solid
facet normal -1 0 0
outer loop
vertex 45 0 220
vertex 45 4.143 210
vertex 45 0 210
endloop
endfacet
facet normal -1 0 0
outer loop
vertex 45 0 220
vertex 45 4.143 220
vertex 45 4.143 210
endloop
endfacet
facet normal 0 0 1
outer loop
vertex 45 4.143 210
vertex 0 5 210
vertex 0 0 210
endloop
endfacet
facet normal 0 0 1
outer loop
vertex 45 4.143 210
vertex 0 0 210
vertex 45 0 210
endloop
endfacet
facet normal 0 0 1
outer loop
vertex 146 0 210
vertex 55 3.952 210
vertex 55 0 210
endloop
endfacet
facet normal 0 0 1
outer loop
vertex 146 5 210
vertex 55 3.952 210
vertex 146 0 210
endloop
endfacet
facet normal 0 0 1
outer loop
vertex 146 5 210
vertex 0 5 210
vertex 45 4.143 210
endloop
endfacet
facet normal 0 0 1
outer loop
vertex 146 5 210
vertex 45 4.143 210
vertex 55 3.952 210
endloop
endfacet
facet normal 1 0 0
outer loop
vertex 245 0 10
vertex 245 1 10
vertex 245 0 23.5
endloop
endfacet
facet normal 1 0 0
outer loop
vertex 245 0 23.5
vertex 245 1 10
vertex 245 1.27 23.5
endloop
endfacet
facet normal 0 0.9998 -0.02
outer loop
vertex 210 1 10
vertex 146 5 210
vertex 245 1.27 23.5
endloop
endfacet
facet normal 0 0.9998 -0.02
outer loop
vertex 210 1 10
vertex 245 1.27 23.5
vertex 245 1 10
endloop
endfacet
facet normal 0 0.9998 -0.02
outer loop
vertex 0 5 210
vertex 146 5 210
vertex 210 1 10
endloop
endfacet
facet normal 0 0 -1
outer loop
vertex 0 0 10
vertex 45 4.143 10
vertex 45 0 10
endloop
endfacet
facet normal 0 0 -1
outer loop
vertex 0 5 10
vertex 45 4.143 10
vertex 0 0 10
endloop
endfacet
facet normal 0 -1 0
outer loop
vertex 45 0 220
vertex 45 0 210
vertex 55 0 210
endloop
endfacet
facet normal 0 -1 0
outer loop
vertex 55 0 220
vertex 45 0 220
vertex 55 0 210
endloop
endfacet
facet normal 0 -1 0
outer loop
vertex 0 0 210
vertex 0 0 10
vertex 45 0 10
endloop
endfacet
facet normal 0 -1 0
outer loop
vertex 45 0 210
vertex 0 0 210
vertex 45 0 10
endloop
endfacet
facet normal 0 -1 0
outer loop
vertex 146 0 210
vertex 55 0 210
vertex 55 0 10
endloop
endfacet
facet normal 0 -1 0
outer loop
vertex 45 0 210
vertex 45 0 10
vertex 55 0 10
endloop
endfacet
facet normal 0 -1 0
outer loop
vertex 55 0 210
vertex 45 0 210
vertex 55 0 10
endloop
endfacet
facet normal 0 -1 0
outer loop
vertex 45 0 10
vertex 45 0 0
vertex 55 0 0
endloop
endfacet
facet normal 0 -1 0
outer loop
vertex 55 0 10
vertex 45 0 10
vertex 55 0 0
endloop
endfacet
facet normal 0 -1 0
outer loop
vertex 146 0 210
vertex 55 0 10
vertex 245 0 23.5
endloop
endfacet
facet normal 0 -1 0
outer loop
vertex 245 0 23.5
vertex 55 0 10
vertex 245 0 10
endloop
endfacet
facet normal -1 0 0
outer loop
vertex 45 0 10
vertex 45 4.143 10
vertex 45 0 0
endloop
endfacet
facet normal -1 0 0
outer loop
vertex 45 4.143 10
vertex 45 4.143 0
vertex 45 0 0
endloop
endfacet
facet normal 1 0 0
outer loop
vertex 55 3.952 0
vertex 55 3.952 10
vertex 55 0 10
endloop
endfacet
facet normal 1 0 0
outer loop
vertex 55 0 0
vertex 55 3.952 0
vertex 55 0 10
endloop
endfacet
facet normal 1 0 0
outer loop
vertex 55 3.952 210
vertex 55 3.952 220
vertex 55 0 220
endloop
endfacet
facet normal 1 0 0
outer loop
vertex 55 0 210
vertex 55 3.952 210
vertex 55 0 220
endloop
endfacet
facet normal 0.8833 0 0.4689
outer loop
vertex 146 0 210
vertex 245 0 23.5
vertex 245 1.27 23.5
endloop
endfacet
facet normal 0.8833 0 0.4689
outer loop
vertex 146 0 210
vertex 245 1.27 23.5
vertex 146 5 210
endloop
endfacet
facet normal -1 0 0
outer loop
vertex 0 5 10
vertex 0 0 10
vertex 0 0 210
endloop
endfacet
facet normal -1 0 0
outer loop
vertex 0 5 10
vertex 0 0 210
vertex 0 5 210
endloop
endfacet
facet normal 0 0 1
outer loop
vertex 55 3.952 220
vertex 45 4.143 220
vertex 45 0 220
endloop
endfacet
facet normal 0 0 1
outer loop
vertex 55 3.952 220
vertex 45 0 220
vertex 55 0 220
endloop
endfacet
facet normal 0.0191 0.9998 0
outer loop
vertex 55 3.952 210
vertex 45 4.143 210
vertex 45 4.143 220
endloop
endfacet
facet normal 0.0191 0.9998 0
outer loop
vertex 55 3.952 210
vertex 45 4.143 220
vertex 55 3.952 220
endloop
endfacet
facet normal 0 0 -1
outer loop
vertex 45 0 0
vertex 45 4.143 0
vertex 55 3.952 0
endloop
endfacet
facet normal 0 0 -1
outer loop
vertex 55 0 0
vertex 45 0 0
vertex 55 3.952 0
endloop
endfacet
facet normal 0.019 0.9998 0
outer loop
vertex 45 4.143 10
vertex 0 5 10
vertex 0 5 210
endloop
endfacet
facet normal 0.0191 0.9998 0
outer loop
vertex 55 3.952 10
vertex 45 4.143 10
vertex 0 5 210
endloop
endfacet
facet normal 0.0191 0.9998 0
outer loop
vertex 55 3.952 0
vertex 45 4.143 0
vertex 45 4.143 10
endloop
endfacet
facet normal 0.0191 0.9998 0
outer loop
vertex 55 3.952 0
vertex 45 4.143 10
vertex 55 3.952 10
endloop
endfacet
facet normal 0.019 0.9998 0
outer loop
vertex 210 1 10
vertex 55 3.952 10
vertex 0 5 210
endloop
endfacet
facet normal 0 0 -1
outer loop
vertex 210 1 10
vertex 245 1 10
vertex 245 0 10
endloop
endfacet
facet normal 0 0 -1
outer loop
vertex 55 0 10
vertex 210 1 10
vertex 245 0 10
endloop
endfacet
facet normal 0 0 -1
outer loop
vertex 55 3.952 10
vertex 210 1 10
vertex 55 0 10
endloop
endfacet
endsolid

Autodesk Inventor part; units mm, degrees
ref_plane "YZ Plane" through (0, 0, 0) normal (1, 0, 0) x (0, 1, 0)
ref_plane "XZ Plane" through (0, 0, 0) normal (0, 1, 0) x (-1, 0, 0)
ref_plane "XY Plane" through (0, 0, 0) normal (0, 0, 1) x (1, 0, 0)
sketch "スケッチ1" plane through (0, 0, 0) normal (0, 1, 0) x (-1, 0, 0)
  point P0 (0, 0)
sketch "スケッチ2" plane through (0, 0, 0) normal (0, 0, 1) x (1, 0, 0)
  line L0 (0, 0) -> (0, 5)
  line L1 (0, 5) -> (210, 1)
  line L2 (0, 0) -> (210, 0)
  line L3 (210, 1) -> (210, 0)
  dimension "d0" = 5
  dimension "d1" = 210
  dimension "d28" = 1
extrude "押し出し1" add sketch "スケッチ2" along normal blind 220
sketch "スケッチ4" plane through (0, 0, 220) normal (0, 0, 1) x (1, 0, 0)
  line L0 (0, 5) -> (0, 0) projected
  line L1 (55, 0) -> (245, 0)
  line L2 (245, 0) -> (245, 5)
  line L3 (245, 5) -> (55, 5)
  line L4 (55, 5) -> (55, 0)
  line L5 (0, 5) -> (45, 5)
  line L6 (45, 5) -> (45, 0)
  line L7 (45, 0) -> (0, 0)
  line L8 (0, 0) -> (0, 5)
  point P0 (0, 0)
  dimension "d8" = 5
  dimension "d9" = 190
  dimension "d10" = 55
  dimension "d23" = 45
  dimension "d30" = 5
extrude "押し出し2" cut sketch "スケッチ4" against normal blind 10
sketch "スケッチ5" plane through (0, 0, 0) normal (0, 0, -1) x (-1, 0, 0)
  line L0 (-55, 0) -> (-245, 0)
  line L1 (-245, 0) -> (-245, 4)
  line L2 (-245, 4) -> (-55, 4)
  line L3 (-55, 4) -> (-55, 0)
  line L4 (0, 5) -> (0, 0) projected
  line L5 (0, 5) -> (-45, 5)
  line L6 (-45, 5) -> (-45, 0)
  line L7 (-45, 0) -> (0, 0)
  line L8 (0, 0) -> (0, 5)
  dimension "d13" = 4
  dimension "d14" = 55
  dimension "d15" = 190
  dimension "d22" = 45
  dimension "d29" = 5
extrude "押し出し3" cut sketch "スケッチ5" against normal blind 10
sketch "スケッチ7" plane through (0, 0, 10) normal (-1, 0, 0) x (0, 0, 1)
  line L0 (200, 0) -> (200, 5)
  line L1 (200, 5) -> (0, 1)
  line L2 (0, 0) -> (200, 0)
  line L3 (0, 1) -> (0, 0)
  point P0 (-10, 0)
  dimension "d24" = 5
  dimension "d27" = 200
  dimension "d31" = 1
extrude "押し出し5" add sketch "スケッチ7" against normal blind 245
sketch "スケッチ6" plane through (0, 0, 0) normal (0, -1, 0) x (1, 0, 0)
  line L0 (0, 0) -> (0, 220) projected
  line L1 (55, 10) -> (210, 10) projected
  line L2 (245, 23.5) -> (146, 210)
  line L3 (245, 210) -> (245, 23.5)
  line L4 (146, 210) -> (245, 23.5)
  line L5 (146, 210) -> (245, 210)
  line L6 (210, 210) -> (55, 210) projected
  point P0 (235, 210)
  point P1 (235, 10)
  dimension "d18" = 146
  dimension "d19" = 13.5
extrude "押し出し4" cut sketch "スケッチ6" against normal blind 10
properties part number "坂"
